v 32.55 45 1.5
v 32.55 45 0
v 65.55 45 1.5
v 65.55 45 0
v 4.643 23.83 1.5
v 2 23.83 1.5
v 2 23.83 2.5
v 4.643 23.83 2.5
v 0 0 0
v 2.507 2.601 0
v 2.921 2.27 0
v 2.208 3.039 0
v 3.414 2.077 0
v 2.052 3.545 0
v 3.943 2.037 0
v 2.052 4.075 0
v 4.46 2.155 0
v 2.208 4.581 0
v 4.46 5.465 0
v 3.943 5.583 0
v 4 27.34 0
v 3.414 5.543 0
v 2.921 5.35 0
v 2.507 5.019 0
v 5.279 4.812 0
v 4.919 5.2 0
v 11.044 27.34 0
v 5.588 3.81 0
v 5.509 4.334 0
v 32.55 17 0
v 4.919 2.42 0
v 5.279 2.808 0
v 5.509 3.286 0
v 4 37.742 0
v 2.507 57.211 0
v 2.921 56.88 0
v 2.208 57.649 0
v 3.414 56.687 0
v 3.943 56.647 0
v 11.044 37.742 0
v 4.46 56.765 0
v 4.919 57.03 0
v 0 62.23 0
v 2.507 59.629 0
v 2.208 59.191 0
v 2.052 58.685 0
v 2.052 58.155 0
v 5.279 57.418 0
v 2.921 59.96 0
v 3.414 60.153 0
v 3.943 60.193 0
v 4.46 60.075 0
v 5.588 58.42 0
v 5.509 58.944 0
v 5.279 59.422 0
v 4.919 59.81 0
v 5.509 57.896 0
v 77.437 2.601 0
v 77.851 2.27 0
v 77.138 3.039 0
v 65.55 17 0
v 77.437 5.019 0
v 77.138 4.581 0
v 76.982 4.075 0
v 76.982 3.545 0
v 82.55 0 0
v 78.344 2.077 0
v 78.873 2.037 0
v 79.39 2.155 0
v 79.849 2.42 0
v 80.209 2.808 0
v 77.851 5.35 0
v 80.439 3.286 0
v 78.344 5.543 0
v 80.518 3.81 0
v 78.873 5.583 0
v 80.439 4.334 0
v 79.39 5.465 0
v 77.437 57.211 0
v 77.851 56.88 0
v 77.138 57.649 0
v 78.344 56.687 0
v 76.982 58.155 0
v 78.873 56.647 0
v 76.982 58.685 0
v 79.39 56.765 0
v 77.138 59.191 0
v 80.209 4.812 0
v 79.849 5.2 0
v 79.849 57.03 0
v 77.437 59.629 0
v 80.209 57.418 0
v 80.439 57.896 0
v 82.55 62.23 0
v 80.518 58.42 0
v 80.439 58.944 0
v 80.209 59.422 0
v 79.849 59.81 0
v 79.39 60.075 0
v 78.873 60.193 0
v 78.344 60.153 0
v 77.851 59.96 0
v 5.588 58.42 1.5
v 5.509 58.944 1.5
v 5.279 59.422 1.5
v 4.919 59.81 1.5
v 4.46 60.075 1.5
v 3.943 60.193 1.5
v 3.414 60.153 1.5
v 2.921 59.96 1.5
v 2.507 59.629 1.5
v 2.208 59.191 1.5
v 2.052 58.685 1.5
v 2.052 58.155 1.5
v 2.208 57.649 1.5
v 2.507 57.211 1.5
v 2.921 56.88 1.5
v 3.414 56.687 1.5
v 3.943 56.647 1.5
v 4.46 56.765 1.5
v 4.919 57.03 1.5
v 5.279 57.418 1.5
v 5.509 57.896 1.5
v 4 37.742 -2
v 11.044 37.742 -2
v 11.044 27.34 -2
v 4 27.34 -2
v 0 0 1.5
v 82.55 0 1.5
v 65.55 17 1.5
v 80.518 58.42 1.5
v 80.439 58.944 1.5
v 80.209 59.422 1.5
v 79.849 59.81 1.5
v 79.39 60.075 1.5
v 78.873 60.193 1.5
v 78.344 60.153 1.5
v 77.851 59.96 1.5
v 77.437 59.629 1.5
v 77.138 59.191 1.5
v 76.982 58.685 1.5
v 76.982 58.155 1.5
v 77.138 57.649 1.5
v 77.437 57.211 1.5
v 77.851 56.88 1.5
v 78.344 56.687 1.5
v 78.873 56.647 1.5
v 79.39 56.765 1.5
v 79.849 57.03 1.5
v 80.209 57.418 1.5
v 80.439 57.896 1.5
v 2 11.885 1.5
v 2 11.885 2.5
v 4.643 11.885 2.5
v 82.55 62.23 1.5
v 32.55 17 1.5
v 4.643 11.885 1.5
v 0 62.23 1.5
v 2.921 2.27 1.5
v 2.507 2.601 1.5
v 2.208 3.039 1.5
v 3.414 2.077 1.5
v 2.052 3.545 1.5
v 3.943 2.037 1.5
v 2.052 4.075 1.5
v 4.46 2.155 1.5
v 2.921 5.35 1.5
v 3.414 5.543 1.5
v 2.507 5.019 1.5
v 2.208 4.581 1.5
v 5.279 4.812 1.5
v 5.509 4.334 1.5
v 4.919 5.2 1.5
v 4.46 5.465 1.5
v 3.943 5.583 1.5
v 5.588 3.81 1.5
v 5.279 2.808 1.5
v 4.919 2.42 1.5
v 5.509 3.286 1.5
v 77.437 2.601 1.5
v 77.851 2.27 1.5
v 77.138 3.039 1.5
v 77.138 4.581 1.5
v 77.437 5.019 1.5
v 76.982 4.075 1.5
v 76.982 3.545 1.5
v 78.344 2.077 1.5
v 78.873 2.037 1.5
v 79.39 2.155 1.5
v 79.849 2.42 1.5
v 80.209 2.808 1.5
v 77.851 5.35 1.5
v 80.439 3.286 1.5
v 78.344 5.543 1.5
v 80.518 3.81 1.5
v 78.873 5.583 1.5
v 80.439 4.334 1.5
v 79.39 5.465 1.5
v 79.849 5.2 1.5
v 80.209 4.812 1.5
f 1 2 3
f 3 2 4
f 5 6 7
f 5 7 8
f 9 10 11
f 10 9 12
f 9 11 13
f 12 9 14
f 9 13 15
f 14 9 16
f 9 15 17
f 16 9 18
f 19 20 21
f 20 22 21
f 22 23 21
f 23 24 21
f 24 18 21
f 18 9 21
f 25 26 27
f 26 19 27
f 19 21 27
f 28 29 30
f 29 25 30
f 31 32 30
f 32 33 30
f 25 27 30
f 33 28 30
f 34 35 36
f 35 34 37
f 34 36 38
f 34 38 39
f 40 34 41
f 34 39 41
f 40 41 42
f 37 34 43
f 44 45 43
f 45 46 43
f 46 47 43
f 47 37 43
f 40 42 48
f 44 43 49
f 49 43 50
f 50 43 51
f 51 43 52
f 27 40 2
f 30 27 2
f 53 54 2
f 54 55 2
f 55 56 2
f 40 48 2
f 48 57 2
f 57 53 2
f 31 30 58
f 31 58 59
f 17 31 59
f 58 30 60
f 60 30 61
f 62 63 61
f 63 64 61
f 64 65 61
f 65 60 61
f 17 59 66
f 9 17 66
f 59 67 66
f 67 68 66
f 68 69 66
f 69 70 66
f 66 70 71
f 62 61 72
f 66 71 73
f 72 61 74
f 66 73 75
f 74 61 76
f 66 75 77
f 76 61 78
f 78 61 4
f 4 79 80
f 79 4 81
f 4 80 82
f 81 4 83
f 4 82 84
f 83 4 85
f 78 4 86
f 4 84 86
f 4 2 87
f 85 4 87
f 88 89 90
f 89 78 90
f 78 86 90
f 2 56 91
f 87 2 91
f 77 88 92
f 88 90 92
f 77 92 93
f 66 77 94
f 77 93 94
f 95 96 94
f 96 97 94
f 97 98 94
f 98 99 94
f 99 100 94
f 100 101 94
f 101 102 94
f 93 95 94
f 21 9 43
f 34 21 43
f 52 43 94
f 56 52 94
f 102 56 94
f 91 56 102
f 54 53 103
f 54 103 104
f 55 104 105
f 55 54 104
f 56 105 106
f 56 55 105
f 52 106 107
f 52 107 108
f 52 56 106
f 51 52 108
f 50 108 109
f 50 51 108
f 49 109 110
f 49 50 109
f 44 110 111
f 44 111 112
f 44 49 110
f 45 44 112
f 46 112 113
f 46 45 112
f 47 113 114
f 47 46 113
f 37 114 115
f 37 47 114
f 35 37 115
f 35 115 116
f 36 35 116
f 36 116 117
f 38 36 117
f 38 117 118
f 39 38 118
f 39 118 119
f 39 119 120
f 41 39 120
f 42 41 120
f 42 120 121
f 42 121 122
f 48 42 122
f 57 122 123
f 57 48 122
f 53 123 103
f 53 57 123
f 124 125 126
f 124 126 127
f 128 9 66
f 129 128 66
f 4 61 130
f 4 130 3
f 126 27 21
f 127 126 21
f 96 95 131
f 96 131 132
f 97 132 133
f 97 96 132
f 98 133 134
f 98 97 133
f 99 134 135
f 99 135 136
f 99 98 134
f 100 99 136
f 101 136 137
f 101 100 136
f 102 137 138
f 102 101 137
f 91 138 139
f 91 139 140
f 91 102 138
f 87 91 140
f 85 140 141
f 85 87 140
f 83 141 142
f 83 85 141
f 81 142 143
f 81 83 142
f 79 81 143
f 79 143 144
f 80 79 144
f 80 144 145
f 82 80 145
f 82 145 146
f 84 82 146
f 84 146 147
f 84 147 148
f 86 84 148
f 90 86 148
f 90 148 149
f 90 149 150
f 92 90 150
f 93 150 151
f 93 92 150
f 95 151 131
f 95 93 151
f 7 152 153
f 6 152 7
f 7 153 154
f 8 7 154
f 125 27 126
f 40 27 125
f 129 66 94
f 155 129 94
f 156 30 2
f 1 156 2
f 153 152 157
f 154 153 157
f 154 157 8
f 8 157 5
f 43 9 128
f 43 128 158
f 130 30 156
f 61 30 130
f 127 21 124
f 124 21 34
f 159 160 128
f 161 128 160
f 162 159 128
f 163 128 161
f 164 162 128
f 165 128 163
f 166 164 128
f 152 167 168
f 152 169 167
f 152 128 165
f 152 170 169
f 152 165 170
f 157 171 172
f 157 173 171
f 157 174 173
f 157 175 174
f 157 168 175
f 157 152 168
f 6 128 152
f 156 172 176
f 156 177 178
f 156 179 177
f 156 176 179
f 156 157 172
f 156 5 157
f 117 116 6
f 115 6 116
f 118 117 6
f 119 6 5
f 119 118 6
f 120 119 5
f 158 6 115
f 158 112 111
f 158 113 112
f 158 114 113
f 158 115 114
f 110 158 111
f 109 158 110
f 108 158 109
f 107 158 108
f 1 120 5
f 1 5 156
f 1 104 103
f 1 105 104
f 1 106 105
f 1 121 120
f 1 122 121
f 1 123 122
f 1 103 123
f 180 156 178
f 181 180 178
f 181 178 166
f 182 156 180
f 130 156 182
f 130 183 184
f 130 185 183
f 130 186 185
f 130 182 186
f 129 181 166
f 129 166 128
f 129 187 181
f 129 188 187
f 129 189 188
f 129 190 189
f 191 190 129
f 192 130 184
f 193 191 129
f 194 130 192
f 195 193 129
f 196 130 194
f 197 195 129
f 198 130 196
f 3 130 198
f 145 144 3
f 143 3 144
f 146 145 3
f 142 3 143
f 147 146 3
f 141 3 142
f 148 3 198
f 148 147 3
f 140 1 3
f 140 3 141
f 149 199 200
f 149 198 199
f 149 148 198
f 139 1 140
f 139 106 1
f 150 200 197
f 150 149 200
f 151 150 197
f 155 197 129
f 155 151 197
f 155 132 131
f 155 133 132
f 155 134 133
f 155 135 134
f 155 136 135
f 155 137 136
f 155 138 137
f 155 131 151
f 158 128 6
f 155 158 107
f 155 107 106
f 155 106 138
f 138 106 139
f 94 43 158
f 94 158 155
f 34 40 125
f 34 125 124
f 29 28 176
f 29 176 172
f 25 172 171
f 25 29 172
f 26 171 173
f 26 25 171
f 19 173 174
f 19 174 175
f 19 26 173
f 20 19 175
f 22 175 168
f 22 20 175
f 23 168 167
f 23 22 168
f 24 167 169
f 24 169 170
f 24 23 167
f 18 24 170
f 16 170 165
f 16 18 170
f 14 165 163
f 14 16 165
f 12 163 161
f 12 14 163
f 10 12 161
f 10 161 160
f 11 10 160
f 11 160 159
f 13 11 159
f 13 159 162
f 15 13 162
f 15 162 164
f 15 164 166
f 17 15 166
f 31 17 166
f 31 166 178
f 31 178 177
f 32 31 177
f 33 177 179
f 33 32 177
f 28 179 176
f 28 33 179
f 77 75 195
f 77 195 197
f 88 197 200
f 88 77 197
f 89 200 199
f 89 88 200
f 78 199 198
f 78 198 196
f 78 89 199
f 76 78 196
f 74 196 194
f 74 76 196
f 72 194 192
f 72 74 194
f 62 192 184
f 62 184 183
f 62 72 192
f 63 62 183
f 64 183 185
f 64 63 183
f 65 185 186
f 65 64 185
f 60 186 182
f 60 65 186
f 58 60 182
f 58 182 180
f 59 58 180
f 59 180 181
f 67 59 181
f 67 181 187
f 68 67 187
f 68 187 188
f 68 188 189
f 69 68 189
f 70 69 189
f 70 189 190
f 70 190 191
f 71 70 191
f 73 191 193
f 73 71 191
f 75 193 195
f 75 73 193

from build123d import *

# Parameters (mm, degrees)
SKETCH1_W           = 82.55
SKETCH1_H           = 62.23
SKETCH1_R           = 1.778
SKETCH1_W_2         = 33
SKETCH1_H_2         = 28
BOSS_EXTRUDE1_DEPTH = 1.5
SKETCH2_W           = 2.642806411
SKETCH2_H           = 11.945484976
BOSS_EXTRUDE2_DEPTH = 1
SKETCH3_W           = 7.043654848
SKETCH3_H           = 10.402717652
BOSS_EXTRUDE3_DEPTH = 2


with BuildPart() as part:
    # Sketch1 → Boss-Extrude1 (new body)
    with BuildSketch(Plane.XY):
        with Locations((41.275, 31.115)):
            Rectangle(SKETCH1_W, SKETCH1_H)
        with Locations((3.81, 58.42)):
            Circle(SKETCH1_R, mode=Mode.SUBTRACT)
        with Locations((78.74, 58.42)):
            Circle(SKETCH1_R, mode=Mode.SUBTRACT)
        with Locations((78.74, 3.81)):
            Circle(SKETCH1_R, mode=Mode.SUBTRACT)
        with Locations((3.81, 3.81)):
            Circle(SKETCH1_R, mode=Mode.SUBTRACT)
        with Locations((49.05, 31)):
            Rectangle(SKETCH1_W_2, SKETCH1_H_2, mode=Mode.SUBTRACT)
    extrude(amount=BOSS_EXTRUDE1_DEPTH)

    # Sketch2 → Boss-Extrude2 (add)
    with BuildSketch(Plane.XY.offset(1.5)):
        with Locations((3.321403206, 17.857601098)):
            Rectangle(SKETCH2_W, SKETCH2_H)
    extrude(amount=BOSS_EXTRUDE2_DEPTH)

    # Sketch3 → Boss-Extrude3 (add)
    with BuildSketch(Plane(origin=(0, 0, 0), x_dir=(-1, 0, 0), z_dir=(0, 0, -1))):
        with Locations((-7.521827424, 32.54095227)):
            Rectangle(SKETCH3_W, SKETCH3_H)
    extrude(amount=BOSS_EXTRUDE3_DEPTH)


solid = part.part
